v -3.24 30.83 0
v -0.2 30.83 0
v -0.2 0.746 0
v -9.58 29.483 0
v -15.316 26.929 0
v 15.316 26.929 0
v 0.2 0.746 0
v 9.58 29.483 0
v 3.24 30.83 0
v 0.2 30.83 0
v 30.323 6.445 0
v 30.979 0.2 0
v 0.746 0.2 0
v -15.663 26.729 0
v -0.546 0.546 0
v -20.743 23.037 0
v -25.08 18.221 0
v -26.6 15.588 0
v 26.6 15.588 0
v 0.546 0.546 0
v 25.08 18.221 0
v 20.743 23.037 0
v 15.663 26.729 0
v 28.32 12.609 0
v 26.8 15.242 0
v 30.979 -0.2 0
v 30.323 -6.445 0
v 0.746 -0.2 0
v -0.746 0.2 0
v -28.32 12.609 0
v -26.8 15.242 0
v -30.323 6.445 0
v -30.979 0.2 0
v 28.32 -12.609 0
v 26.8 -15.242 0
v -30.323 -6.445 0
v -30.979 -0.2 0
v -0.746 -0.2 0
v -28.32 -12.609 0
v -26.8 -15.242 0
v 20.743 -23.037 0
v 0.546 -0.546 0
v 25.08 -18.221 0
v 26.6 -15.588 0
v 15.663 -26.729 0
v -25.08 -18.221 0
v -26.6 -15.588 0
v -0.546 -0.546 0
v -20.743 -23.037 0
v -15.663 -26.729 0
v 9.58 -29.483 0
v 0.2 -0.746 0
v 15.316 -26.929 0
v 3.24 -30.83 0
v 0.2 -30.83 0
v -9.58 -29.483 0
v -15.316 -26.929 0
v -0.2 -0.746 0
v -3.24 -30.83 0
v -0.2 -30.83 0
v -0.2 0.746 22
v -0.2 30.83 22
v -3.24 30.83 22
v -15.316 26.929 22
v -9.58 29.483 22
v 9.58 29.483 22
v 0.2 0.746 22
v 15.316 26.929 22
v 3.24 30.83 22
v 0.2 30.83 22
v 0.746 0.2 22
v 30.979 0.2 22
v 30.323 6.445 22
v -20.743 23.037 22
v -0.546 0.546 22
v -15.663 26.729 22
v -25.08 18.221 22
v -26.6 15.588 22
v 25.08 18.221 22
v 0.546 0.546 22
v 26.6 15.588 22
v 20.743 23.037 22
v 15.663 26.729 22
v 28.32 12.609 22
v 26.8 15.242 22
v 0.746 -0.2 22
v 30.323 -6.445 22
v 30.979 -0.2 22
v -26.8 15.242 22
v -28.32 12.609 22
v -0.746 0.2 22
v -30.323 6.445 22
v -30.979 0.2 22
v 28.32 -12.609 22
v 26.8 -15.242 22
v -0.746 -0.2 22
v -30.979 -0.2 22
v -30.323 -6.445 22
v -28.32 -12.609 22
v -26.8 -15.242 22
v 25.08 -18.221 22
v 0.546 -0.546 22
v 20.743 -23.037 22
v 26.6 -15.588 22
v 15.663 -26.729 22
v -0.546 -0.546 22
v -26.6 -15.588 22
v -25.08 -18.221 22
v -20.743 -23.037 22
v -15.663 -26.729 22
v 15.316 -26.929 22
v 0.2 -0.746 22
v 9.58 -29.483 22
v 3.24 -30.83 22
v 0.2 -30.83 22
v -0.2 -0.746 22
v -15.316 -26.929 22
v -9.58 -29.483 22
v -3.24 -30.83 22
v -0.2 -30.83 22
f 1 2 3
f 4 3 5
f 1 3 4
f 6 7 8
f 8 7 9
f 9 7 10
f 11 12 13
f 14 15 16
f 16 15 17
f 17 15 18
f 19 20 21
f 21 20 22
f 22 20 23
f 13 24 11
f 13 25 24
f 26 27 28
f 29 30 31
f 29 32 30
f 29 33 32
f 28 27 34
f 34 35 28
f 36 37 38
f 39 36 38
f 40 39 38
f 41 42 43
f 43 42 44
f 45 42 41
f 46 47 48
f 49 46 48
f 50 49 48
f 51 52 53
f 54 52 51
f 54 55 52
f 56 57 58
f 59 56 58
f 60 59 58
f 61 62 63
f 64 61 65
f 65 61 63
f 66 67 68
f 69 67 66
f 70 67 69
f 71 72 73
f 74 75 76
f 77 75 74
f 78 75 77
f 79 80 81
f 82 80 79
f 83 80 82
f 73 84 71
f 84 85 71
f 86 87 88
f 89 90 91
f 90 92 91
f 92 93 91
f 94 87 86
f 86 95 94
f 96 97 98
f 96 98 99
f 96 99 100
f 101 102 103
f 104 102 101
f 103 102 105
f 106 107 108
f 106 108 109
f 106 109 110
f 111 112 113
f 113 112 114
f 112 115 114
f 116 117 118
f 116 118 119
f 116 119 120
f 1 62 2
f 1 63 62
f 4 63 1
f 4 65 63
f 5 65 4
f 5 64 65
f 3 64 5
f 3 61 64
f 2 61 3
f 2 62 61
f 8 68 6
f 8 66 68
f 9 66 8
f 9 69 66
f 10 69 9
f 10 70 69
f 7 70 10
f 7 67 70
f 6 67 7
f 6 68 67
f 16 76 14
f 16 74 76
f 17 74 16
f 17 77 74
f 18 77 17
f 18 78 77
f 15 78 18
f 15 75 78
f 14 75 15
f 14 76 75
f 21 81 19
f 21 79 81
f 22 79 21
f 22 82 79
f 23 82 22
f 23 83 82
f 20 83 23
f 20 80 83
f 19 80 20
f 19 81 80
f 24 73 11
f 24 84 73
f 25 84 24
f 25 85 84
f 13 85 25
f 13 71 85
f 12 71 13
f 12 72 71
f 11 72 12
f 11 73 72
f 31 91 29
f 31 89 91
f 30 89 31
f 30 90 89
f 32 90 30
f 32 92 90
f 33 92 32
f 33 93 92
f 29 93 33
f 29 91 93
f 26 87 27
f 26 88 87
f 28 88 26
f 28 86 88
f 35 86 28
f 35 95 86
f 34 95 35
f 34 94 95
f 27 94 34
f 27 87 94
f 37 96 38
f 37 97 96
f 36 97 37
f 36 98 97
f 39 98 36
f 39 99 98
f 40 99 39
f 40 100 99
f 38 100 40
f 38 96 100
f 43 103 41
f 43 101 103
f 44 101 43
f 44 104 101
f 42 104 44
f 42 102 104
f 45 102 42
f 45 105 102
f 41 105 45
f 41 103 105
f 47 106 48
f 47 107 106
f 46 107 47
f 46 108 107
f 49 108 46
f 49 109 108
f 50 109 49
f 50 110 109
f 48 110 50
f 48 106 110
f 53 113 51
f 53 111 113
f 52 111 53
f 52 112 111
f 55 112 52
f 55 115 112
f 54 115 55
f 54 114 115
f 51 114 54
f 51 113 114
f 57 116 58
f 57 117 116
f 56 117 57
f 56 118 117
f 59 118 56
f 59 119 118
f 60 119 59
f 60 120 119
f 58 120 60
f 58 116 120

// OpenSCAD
//Konfiguration
//Radius
    r = 31;
//Höhe des Kuchens
    h = 22;
//Anzahl der Stücke (gerade Zahl)
    n = 12;
    
module Schnitt (b = 0.4, l = 2*r+2)
    translate([0, 0, 0])
    for (i = [0:n-1]) {
        rotate(i*360/n)
        square([b, l], true);
    }

module Kuchen ()
    linear_extrude(height = h)
    difference(){
        circle(r, true);
        Schnitt();   
}

Kuchen ();
